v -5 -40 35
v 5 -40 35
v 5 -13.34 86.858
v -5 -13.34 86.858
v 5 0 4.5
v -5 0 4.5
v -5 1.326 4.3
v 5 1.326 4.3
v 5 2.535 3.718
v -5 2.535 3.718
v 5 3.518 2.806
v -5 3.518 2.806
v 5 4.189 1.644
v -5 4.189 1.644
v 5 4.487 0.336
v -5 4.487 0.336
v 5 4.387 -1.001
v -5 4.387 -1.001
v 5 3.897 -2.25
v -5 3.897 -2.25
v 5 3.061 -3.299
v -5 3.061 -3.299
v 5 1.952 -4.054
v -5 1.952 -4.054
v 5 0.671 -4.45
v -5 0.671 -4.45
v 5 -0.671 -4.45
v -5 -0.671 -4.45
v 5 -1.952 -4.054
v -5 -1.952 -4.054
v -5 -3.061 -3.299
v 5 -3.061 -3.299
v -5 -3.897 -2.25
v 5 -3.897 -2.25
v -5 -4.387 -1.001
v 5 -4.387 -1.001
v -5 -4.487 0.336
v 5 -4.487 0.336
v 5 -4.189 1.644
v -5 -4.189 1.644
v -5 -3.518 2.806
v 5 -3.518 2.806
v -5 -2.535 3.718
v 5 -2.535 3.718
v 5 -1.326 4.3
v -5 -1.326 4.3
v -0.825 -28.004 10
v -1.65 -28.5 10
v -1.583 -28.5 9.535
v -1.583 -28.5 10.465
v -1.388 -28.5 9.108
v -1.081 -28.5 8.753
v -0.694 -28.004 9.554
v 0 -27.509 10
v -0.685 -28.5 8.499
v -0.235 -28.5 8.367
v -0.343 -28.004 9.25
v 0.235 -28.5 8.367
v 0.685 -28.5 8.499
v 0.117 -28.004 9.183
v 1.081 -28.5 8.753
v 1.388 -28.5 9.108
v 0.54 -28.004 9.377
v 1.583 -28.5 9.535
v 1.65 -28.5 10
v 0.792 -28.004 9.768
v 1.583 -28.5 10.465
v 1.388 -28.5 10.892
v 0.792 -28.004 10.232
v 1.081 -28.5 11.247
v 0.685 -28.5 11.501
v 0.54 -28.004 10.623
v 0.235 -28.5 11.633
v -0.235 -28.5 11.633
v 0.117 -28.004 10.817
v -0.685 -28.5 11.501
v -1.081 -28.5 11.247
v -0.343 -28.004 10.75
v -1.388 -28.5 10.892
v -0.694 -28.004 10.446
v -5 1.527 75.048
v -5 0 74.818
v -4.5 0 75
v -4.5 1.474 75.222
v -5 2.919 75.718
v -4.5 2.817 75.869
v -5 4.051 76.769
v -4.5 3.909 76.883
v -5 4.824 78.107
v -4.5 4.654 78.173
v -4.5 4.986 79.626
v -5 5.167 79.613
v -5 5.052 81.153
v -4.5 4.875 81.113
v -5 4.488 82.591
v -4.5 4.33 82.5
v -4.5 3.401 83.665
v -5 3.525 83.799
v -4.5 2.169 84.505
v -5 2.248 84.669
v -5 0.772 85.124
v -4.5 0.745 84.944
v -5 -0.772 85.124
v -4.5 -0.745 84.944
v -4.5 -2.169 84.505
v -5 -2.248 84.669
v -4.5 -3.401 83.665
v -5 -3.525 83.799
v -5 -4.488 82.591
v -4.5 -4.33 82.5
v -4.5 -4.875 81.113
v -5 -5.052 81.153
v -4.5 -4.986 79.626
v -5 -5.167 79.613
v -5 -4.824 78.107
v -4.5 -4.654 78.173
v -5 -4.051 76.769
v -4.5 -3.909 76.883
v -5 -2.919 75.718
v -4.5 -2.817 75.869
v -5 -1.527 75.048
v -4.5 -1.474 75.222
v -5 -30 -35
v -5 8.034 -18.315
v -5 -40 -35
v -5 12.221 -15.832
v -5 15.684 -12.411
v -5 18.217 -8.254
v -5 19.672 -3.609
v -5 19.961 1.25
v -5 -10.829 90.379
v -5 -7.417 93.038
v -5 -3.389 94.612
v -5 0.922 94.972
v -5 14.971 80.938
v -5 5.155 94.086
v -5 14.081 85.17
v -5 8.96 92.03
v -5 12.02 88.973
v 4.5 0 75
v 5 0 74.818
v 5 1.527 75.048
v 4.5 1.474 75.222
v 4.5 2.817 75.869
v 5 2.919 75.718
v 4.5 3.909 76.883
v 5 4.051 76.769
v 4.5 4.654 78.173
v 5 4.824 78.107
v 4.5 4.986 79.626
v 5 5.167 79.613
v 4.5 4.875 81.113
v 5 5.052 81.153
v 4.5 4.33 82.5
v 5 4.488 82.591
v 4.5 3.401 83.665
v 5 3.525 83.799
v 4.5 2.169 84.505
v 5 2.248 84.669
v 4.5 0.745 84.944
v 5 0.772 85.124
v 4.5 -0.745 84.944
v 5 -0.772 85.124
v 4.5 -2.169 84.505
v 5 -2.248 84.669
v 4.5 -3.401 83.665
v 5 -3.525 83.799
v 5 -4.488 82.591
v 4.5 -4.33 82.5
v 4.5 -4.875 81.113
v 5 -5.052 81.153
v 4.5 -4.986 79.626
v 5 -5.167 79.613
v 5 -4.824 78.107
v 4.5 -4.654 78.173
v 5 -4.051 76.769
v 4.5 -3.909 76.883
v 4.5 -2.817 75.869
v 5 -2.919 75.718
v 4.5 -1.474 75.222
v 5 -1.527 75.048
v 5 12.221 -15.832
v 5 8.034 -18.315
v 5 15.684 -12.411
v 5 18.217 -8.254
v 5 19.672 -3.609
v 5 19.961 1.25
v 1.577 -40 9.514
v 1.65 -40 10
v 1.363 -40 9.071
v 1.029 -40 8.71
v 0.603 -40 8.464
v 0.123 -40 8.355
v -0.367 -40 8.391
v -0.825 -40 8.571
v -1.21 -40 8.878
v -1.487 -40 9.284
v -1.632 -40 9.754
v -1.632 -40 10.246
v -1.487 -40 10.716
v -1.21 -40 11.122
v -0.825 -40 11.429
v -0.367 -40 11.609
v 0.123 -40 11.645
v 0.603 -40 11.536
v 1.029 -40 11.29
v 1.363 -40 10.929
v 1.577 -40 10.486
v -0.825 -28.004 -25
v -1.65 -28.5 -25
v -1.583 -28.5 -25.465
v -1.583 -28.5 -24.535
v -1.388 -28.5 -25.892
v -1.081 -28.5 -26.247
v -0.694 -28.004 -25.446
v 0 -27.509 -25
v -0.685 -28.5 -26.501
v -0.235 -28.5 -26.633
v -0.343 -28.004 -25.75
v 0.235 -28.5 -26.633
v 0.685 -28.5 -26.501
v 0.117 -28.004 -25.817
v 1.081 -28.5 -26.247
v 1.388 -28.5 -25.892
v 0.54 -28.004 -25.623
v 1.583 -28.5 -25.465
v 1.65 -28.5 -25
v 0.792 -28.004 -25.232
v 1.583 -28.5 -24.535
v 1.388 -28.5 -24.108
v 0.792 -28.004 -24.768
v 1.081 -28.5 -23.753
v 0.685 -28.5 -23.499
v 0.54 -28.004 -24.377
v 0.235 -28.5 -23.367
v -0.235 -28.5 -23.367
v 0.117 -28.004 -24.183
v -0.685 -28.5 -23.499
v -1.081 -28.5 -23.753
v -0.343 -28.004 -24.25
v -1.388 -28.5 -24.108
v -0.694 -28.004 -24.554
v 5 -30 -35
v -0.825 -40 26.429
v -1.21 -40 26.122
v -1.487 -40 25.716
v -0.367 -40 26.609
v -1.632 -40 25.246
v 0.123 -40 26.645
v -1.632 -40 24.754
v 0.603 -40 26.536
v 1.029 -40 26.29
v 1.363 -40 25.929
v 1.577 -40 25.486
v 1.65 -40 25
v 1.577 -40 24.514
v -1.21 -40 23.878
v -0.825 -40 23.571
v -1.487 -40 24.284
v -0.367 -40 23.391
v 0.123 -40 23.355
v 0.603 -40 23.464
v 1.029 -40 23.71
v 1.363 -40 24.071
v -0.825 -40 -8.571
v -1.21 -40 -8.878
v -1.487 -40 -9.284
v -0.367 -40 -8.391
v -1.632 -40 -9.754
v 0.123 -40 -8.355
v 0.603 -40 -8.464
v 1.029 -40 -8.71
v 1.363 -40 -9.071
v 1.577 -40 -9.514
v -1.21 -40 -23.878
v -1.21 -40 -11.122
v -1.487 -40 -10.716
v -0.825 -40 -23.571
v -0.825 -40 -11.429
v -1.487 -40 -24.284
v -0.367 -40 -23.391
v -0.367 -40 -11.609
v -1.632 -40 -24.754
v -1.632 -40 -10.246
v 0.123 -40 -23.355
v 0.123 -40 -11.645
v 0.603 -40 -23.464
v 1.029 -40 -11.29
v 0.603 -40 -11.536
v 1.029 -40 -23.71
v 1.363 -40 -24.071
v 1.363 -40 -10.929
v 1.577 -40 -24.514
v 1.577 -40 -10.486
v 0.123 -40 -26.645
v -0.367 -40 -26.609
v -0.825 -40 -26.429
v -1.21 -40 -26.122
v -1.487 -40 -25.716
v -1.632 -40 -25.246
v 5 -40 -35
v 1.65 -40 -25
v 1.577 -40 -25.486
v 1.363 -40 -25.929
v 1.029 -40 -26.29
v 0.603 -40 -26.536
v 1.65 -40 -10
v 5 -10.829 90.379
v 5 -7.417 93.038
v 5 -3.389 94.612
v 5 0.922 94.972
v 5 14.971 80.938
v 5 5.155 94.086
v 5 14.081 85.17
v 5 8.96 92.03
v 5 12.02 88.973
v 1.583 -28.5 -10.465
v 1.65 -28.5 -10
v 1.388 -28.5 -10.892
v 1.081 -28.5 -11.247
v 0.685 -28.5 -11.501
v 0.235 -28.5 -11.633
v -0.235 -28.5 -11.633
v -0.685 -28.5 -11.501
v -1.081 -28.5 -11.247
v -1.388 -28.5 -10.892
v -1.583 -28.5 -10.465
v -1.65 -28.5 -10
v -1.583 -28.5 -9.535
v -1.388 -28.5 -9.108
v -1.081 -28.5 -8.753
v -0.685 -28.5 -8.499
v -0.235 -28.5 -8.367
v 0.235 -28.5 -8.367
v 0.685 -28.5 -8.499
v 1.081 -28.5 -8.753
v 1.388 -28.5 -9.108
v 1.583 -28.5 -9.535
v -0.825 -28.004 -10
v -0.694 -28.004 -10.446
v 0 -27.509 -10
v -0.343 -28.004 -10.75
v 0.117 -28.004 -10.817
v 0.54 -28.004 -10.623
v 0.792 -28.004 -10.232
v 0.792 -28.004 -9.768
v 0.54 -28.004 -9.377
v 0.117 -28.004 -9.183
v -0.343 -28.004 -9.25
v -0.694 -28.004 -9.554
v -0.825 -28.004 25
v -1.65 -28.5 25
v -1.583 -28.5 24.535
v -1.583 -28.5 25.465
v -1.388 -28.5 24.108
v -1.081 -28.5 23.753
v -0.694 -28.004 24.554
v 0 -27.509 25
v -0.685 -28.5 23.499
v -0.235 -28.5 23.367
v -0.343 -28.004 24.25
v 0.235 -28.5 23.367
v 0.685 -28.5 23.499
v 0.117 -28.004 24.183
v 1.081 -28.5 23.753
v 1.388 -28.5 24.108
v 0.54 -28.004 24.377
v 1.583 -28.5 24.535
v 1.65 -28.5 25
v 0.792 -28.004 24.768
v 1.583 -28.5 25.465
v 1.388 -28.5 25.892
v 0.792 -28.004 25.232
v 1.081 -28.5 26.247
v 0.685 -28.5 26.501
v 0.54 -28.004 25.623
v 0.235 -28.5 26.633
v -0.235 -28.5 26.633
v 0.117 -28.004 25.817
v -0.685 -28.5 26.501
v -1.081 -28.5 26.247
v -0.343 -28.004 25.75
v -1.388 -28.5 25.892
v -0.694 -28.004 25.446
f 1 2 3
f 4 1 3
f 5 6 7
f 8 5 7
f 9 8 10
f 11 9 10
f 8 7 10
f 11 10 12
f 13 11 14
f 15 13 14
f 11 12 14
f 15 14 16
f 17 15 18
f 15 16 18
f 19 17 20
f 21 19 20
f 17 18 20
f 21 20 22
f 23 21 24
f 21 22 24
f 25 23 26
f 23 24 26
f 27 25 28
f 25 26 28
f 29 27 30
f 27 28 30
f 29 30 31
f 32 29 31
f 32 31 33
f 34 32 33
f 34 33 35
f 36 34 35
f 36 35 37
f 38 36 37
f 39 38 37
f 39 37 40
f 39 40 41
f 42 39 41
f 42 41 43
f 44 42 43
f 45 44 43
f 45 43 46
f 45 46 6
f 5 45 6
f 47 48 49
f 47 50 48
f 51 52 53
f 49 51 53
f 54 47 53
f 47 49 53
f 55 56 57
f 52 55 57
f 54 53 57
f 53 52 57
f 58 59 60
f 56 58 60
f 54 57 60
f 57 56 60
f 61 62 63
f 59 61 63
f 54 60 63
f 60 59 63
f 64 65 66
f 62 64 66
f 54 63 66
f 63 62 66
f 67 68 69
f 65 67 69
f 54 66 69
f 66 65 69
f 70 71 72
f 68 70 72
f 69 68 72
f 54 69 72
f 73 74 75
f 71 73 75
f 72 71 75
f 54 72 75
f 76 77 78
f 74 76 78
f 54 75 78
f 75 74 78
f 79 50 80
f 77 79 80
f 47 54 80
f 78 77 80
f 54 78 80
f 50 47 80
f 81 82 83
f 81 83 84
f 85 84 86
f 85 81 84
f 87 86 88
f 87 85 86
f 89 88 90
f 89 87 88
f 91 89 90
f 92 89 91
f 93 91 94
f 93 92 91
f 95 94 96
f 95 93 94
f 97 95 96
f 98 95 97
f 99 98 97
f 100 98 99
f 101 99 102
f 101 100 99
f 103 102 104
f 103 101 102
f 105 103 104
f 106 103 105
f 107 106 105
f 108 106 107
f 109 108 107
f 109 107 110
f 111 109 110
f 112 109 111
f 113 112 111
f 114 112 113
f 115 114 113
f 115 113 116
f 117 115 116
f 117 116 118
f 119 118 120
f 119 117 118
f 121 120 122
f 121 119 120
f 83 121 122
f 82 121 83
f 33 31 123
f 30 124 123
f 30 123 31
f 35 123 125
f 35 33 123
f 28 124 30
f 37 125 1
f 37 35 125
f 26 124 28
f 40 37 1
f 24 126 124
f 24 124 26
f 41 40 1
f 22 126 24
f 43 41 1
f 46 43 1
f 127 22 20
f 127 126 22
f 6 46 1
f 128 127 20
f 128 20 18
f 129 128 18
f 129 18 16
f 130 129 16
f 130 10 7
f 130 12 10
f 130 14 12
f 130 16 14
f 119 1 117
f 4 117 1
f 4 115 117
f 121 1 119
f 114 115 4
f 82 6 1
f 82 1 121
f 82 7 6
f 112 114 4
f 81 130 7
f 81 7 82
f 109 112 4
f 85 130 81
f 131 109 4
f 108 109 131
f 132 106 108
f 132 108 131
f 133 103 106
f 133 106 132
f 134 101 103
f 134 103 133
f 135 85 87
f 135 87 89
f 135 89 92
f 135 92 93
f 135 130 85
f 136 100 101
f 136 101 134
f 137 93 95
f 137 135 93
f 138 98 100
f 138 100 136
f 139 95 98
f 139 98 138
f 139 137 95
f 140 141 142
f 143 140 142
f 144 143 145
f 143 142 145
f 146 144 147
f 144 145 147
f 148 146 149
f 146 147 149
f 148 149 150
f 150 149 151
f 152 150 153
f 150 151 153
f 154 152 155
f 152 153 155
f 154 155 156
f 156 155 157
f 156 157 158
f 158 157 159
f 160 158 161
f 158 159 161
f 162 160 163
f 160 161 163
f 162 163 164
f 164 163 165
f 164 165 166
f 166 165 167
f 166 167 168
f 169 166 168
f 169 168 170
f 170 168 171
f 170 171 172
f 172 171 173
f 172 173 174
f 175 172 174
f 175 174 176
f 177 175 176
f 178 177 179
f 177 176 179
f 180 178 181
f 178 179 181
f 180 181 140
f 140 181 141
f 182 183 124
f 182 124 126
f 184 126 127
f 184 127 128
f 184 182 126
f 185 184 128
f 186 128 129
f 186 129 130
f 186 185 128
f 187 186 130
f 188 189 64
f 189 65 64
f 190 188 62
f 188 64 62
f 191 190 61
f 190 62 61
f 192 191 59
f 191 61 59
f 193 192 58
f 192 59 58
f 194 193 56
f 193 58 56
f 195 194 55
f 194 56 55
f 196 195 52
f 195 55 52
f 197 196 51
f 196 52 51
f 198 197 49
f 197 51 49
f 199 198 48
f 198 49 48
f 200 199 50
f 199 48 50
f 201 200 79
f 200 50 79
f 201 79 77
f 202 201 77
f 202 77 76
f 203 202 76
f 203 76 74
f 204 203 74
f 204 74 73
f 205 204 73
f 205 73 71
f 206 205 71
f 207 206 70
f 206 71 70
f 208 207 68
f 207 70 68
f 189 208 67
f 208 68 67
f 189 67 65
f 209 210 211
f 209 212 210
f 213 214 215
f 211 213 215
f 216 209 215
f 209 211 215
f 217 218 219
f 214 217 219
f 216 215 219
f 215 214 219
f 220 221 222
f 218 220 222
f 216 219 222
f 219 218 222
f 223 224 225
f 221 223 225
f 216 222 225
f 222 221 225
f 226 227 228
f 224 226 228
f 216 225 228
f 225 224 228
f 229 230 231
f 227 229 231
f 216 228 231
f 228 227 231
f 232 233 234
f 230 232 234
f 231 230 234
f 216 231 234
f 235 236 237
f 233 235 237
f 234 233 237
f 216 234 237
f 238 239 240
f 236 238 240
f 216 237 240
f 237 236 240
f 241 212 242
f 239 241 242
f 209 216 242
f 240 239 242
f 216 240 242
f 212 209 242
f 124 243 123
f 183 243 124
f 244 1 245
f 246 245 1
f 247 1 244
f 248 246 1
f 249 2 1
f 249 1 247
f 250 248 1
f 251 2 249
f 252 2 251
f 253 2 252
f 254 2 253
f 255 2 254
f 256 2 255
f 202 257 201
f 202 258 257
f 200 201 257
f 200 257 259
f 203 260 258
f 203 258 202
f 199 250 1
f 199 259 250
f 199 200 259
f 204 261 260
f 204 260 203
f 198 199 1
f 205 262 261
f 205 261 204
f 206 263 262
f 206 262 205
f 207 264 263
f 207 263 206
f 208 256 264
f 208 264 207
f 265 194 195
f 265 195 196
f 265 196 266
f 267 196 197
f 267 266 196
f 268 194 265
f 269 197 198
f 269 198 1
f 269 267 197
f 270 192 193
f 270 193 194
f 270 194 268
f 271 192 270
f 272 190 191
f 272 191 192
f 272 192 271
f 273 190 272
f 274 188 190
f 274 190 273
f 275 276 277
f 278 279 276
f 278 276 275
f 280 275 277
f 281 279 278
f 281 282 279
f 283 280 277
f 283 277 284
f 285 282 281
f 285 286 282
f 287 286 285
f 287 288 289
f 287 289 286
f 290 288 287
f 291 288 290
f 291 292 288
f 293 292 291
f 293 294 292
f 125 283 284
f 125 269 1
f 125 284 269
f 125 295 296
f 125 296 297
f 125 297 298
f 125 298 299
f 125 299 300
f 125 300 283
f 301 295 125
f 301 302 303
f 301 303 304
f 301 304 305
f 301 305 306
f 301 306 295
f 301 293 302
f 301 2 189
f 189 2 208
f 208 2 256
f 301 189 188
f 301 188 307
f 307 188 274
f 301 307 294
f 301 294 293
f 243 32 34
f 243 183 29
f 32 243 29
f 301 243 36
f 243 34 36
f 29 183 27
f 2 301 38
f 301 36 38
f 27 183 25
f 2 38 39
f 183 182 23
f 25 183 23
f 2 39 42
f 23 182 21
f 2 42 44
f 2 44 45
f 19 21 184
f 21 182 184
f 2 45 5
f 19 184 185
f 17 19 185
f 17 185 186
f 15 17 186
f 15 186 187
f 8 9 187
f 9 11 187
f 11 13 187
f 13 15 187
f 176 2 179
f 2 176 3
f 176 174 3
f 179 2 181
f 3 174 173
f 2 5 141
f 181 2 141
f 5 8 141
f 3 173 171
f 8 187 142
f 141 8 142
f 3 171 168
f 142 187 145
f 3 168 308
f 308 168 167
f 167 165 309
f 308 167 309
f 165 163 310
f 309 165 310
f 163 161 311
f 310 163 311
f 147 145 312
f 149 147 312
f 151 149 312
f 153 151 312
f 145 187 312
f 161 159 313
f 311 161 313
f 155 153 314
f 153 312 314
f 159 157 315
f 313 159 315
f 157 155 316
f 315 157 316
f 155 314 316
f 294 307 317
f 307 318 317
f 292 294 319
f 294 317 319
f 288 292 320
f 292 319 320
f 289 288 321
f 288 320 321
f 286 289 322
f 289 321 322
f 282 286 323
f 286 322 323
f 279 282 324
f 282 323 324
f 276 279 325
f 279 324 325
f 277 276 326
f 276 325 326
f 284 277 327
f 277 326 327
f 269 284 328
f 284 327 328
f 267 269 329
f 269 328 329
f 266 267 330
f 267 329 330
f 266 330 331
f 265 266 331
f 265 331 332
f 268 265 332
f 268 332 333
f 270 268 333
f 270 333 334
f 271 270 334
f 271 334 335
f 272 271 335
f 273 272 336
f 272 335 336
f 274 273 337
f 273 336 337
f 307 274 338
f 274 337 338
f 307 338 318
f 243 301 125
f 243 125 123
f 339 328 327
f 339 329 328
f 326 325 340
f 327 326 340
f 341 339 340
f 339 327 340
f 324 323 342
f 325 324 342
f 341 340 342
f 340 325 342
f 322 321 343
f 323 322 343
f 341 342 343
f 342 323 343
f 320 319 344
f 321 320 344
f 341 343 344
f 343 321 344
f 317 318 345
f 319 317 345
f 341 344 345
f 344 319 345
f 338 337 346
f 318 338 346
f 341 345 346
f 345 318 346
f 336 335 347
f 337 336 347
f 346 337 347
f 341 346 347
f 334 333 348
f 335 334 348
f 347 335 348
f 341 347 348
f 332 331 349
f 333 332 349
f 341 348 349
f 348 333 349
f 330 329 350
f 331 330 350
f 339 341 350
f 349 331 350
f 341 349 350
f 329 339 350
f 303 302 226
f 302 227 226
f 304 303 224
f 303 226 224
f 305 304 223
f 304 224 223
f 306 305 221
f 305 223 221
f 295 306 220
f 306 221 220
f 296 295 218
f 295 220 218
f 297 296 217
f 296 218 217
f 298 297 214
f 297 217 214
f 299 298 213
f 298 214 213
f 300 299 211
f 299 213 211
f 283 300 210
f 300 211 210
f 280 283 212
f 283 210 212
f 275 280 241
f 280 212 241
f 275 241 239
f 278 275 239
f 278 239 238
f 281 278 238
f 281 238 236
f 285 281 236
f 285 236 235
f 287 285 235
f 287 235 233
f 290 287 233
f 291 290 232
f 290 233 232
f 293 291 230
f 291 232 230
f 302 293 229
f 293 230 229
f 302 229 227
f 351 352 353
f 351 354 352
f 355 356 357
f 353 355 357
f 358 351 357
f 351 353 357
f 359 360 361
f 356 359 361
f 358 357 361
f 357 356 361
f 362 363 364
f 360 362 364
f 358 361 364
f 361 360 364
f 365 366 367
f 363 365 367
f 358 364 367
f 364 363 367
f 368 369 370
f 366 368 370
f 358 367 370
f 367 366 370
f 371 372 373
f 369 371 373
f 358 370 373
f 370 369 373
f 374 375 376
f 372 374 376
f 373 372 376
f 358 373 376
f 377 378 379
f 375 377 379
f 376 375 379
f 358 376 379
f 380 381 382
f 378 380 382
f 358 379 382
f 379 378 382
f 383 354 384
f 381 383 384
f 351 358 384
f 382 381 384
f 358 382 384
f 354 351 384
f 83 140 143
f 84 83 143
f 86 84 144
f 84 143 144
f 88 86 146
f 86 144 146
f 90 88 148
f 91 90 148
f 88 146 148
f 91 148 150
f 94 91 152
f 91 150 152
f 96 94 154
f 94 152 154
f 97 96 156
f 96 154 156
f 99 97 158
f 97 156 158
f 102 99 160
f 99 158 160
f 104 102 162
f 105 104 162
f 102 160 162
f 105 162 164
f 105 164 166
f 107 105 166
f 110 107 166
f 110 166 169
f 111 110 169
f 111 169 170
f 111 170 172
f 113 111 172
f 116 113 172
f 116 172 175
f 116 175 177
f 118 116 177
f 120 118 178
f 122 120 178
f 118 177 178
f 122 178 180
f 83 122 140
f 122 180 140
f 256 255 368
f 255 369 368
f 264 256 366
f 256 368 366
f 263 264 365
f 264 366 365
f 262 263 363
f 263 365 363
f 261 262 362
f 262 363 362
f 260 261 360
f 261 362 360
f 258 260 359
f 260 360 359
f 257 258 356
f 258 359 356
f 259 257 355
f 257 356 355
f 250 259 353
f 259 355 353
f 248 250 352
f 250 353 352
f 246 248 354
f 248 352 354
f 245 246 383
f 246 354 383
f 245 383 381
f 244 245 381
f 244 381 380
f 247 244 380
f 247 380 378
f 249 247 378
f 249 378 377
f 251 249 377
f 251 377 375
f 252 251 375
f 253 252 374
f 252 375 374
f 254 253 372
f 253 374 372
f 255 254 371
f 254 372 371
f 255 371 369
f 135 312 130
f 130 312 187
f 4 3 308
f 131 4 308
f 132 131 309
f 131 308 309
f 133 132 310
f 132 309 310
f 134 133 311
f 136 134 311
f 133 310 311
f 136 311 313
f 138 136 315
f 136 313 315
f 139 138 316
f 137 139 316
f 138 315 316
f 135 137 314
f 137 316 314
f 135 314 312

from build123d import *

# Parameters (mm, degrees)
BOSS_EXTRUDE1_DEPTH      = 5
F_9_0_9_DIAMETER_HOLE1_D = 9
M4_TAPPED_HOLE1_D        = 3.3
M4_TAPPED_HOLE1_DEPTH    = 11.5
M4_TAPPED_HOLE1_TIP      = 0.991420021
BOSS_EXTRUDE2_DEPTH      = 10
SKETCH8_R                = 5
CUT_EXTRUDE1_DEPTH       = 10
CHAMFER1_SIZE            = 0.5
CHAMFER1_SIZE2           = 0.181985117


with BuildPart() as part:
    # Sketch1 → Boss-Extrude1 (new, symmetric)
    with BuildSketch(Plane(origin=(0, 0, 0), x_dir=(0, 0, -1), z_dir=(1, 0, 0))):
        with BuildLine():
            Line((-18.315233689, 8.034439304), (-35, -30))
            Line((-35, -30), (-35, -40))
            Line((-35, -40), (35, -40))
            Line((35, -40), (35, -30))
            Line((35, -30), (18.315233689, 8.034439304))
            ThreePointArc((18.315233689, 8.034439304), (0, 20), (-18.315233689, 8.034439304))
        make_face()
    extrude(amount=BOSS_EXTRUDE1_DEPTH, both=True)

    # Ø9.0 (9) Diameter Hole1 (through all)
    with Locations(Plane(origin=(5, 0, 0), x_dir=(0, 0, -1), z_dir=(1, 0, 0))):
        with Locations((0, 0)):
            Hole(F_9_0_9_DIAMETER_HOLE1_D / 2)

    # M4 Tapped Hole1
    with Locations(Plane(origin=(0, -40, 0), x_dir=(-1, 0, 0), z_dir=(0, -1, 0))):
        with Locations((0, -25), (0, -10), (0, 10), (0, 25)):
            Hole(M4_TAPPED_HOLE1_D / 2, depth=M4_TAPPED_HOLE1_DEPTH)
            with Locations((0, 0, -(M4_TAPPED_HOLE1_DEPTH + M4_TAPPED_HOLE1_TIP / 2))):  # 118° drill point
                Cone(0, M4_TAPPED_HOLE1_D / 2, M4_TAPPED_HOLE1_TIP, mode=Mode.SUBTRACT)

    # Sketch7 → Boss-Extrude2 (add)
    with BuildSketch(Plane(origin=(5, 0, 0), x_dir=(0, 0, -1), z_dir=(1, 0, 0))):
        with BuildLine():
            Line((-80.9375, 14.970674459), (-1.25, 19.960899278))
            ThreePointArc((-1.25, 19.960899278), (-11.456862756, 16.393300333), (-18.315233689, 8.034439304))
            Line((-18.315233689, 8.034439304), (-35, -30))
            Line((-35, -30), (-35, -40))
            Line((-35, -40), (-86.858127274, -13.340393184))
            ThreePointArc((-86.858127274, -13.340393184), (-94.682373409, 3.070490366), (-80.9375, 14.970674459))
        make_face()
    extrude(amount=-BOSS_EXTRUDE2_DEPTH)

    # Sketch8 → Cut-Extrude1 (cut)
    with BuildSketch(Plane(origin=(5, 0, 0), x_dir=(0, 0, -1), z_dir=(1, 0, 0))):
        with Locations((-80, 0)):
            Circle(SKETCH8_R)
    extrude(amount=-CUT_EXTRUDE1_DEPTH, mode=Mode.SUBTRACT)

    # Chamfer1
    chamfer1_edges = [part.edges().sort_by_distance(p)[0] for p in [
        (-5, 0, 85),
        (5, 0, 85),
    ]]
    chamfer1_side = [part.faces().sort_by_distance(p)[0] for p in [
        (0, 0, 85),
    ]]
    chamfer(chamfer1_edges, length=CHAMFER1_SIZE, length2=CHAMFER1_SIZE2, reference=chamfer1_side[0])


solid = part.part
